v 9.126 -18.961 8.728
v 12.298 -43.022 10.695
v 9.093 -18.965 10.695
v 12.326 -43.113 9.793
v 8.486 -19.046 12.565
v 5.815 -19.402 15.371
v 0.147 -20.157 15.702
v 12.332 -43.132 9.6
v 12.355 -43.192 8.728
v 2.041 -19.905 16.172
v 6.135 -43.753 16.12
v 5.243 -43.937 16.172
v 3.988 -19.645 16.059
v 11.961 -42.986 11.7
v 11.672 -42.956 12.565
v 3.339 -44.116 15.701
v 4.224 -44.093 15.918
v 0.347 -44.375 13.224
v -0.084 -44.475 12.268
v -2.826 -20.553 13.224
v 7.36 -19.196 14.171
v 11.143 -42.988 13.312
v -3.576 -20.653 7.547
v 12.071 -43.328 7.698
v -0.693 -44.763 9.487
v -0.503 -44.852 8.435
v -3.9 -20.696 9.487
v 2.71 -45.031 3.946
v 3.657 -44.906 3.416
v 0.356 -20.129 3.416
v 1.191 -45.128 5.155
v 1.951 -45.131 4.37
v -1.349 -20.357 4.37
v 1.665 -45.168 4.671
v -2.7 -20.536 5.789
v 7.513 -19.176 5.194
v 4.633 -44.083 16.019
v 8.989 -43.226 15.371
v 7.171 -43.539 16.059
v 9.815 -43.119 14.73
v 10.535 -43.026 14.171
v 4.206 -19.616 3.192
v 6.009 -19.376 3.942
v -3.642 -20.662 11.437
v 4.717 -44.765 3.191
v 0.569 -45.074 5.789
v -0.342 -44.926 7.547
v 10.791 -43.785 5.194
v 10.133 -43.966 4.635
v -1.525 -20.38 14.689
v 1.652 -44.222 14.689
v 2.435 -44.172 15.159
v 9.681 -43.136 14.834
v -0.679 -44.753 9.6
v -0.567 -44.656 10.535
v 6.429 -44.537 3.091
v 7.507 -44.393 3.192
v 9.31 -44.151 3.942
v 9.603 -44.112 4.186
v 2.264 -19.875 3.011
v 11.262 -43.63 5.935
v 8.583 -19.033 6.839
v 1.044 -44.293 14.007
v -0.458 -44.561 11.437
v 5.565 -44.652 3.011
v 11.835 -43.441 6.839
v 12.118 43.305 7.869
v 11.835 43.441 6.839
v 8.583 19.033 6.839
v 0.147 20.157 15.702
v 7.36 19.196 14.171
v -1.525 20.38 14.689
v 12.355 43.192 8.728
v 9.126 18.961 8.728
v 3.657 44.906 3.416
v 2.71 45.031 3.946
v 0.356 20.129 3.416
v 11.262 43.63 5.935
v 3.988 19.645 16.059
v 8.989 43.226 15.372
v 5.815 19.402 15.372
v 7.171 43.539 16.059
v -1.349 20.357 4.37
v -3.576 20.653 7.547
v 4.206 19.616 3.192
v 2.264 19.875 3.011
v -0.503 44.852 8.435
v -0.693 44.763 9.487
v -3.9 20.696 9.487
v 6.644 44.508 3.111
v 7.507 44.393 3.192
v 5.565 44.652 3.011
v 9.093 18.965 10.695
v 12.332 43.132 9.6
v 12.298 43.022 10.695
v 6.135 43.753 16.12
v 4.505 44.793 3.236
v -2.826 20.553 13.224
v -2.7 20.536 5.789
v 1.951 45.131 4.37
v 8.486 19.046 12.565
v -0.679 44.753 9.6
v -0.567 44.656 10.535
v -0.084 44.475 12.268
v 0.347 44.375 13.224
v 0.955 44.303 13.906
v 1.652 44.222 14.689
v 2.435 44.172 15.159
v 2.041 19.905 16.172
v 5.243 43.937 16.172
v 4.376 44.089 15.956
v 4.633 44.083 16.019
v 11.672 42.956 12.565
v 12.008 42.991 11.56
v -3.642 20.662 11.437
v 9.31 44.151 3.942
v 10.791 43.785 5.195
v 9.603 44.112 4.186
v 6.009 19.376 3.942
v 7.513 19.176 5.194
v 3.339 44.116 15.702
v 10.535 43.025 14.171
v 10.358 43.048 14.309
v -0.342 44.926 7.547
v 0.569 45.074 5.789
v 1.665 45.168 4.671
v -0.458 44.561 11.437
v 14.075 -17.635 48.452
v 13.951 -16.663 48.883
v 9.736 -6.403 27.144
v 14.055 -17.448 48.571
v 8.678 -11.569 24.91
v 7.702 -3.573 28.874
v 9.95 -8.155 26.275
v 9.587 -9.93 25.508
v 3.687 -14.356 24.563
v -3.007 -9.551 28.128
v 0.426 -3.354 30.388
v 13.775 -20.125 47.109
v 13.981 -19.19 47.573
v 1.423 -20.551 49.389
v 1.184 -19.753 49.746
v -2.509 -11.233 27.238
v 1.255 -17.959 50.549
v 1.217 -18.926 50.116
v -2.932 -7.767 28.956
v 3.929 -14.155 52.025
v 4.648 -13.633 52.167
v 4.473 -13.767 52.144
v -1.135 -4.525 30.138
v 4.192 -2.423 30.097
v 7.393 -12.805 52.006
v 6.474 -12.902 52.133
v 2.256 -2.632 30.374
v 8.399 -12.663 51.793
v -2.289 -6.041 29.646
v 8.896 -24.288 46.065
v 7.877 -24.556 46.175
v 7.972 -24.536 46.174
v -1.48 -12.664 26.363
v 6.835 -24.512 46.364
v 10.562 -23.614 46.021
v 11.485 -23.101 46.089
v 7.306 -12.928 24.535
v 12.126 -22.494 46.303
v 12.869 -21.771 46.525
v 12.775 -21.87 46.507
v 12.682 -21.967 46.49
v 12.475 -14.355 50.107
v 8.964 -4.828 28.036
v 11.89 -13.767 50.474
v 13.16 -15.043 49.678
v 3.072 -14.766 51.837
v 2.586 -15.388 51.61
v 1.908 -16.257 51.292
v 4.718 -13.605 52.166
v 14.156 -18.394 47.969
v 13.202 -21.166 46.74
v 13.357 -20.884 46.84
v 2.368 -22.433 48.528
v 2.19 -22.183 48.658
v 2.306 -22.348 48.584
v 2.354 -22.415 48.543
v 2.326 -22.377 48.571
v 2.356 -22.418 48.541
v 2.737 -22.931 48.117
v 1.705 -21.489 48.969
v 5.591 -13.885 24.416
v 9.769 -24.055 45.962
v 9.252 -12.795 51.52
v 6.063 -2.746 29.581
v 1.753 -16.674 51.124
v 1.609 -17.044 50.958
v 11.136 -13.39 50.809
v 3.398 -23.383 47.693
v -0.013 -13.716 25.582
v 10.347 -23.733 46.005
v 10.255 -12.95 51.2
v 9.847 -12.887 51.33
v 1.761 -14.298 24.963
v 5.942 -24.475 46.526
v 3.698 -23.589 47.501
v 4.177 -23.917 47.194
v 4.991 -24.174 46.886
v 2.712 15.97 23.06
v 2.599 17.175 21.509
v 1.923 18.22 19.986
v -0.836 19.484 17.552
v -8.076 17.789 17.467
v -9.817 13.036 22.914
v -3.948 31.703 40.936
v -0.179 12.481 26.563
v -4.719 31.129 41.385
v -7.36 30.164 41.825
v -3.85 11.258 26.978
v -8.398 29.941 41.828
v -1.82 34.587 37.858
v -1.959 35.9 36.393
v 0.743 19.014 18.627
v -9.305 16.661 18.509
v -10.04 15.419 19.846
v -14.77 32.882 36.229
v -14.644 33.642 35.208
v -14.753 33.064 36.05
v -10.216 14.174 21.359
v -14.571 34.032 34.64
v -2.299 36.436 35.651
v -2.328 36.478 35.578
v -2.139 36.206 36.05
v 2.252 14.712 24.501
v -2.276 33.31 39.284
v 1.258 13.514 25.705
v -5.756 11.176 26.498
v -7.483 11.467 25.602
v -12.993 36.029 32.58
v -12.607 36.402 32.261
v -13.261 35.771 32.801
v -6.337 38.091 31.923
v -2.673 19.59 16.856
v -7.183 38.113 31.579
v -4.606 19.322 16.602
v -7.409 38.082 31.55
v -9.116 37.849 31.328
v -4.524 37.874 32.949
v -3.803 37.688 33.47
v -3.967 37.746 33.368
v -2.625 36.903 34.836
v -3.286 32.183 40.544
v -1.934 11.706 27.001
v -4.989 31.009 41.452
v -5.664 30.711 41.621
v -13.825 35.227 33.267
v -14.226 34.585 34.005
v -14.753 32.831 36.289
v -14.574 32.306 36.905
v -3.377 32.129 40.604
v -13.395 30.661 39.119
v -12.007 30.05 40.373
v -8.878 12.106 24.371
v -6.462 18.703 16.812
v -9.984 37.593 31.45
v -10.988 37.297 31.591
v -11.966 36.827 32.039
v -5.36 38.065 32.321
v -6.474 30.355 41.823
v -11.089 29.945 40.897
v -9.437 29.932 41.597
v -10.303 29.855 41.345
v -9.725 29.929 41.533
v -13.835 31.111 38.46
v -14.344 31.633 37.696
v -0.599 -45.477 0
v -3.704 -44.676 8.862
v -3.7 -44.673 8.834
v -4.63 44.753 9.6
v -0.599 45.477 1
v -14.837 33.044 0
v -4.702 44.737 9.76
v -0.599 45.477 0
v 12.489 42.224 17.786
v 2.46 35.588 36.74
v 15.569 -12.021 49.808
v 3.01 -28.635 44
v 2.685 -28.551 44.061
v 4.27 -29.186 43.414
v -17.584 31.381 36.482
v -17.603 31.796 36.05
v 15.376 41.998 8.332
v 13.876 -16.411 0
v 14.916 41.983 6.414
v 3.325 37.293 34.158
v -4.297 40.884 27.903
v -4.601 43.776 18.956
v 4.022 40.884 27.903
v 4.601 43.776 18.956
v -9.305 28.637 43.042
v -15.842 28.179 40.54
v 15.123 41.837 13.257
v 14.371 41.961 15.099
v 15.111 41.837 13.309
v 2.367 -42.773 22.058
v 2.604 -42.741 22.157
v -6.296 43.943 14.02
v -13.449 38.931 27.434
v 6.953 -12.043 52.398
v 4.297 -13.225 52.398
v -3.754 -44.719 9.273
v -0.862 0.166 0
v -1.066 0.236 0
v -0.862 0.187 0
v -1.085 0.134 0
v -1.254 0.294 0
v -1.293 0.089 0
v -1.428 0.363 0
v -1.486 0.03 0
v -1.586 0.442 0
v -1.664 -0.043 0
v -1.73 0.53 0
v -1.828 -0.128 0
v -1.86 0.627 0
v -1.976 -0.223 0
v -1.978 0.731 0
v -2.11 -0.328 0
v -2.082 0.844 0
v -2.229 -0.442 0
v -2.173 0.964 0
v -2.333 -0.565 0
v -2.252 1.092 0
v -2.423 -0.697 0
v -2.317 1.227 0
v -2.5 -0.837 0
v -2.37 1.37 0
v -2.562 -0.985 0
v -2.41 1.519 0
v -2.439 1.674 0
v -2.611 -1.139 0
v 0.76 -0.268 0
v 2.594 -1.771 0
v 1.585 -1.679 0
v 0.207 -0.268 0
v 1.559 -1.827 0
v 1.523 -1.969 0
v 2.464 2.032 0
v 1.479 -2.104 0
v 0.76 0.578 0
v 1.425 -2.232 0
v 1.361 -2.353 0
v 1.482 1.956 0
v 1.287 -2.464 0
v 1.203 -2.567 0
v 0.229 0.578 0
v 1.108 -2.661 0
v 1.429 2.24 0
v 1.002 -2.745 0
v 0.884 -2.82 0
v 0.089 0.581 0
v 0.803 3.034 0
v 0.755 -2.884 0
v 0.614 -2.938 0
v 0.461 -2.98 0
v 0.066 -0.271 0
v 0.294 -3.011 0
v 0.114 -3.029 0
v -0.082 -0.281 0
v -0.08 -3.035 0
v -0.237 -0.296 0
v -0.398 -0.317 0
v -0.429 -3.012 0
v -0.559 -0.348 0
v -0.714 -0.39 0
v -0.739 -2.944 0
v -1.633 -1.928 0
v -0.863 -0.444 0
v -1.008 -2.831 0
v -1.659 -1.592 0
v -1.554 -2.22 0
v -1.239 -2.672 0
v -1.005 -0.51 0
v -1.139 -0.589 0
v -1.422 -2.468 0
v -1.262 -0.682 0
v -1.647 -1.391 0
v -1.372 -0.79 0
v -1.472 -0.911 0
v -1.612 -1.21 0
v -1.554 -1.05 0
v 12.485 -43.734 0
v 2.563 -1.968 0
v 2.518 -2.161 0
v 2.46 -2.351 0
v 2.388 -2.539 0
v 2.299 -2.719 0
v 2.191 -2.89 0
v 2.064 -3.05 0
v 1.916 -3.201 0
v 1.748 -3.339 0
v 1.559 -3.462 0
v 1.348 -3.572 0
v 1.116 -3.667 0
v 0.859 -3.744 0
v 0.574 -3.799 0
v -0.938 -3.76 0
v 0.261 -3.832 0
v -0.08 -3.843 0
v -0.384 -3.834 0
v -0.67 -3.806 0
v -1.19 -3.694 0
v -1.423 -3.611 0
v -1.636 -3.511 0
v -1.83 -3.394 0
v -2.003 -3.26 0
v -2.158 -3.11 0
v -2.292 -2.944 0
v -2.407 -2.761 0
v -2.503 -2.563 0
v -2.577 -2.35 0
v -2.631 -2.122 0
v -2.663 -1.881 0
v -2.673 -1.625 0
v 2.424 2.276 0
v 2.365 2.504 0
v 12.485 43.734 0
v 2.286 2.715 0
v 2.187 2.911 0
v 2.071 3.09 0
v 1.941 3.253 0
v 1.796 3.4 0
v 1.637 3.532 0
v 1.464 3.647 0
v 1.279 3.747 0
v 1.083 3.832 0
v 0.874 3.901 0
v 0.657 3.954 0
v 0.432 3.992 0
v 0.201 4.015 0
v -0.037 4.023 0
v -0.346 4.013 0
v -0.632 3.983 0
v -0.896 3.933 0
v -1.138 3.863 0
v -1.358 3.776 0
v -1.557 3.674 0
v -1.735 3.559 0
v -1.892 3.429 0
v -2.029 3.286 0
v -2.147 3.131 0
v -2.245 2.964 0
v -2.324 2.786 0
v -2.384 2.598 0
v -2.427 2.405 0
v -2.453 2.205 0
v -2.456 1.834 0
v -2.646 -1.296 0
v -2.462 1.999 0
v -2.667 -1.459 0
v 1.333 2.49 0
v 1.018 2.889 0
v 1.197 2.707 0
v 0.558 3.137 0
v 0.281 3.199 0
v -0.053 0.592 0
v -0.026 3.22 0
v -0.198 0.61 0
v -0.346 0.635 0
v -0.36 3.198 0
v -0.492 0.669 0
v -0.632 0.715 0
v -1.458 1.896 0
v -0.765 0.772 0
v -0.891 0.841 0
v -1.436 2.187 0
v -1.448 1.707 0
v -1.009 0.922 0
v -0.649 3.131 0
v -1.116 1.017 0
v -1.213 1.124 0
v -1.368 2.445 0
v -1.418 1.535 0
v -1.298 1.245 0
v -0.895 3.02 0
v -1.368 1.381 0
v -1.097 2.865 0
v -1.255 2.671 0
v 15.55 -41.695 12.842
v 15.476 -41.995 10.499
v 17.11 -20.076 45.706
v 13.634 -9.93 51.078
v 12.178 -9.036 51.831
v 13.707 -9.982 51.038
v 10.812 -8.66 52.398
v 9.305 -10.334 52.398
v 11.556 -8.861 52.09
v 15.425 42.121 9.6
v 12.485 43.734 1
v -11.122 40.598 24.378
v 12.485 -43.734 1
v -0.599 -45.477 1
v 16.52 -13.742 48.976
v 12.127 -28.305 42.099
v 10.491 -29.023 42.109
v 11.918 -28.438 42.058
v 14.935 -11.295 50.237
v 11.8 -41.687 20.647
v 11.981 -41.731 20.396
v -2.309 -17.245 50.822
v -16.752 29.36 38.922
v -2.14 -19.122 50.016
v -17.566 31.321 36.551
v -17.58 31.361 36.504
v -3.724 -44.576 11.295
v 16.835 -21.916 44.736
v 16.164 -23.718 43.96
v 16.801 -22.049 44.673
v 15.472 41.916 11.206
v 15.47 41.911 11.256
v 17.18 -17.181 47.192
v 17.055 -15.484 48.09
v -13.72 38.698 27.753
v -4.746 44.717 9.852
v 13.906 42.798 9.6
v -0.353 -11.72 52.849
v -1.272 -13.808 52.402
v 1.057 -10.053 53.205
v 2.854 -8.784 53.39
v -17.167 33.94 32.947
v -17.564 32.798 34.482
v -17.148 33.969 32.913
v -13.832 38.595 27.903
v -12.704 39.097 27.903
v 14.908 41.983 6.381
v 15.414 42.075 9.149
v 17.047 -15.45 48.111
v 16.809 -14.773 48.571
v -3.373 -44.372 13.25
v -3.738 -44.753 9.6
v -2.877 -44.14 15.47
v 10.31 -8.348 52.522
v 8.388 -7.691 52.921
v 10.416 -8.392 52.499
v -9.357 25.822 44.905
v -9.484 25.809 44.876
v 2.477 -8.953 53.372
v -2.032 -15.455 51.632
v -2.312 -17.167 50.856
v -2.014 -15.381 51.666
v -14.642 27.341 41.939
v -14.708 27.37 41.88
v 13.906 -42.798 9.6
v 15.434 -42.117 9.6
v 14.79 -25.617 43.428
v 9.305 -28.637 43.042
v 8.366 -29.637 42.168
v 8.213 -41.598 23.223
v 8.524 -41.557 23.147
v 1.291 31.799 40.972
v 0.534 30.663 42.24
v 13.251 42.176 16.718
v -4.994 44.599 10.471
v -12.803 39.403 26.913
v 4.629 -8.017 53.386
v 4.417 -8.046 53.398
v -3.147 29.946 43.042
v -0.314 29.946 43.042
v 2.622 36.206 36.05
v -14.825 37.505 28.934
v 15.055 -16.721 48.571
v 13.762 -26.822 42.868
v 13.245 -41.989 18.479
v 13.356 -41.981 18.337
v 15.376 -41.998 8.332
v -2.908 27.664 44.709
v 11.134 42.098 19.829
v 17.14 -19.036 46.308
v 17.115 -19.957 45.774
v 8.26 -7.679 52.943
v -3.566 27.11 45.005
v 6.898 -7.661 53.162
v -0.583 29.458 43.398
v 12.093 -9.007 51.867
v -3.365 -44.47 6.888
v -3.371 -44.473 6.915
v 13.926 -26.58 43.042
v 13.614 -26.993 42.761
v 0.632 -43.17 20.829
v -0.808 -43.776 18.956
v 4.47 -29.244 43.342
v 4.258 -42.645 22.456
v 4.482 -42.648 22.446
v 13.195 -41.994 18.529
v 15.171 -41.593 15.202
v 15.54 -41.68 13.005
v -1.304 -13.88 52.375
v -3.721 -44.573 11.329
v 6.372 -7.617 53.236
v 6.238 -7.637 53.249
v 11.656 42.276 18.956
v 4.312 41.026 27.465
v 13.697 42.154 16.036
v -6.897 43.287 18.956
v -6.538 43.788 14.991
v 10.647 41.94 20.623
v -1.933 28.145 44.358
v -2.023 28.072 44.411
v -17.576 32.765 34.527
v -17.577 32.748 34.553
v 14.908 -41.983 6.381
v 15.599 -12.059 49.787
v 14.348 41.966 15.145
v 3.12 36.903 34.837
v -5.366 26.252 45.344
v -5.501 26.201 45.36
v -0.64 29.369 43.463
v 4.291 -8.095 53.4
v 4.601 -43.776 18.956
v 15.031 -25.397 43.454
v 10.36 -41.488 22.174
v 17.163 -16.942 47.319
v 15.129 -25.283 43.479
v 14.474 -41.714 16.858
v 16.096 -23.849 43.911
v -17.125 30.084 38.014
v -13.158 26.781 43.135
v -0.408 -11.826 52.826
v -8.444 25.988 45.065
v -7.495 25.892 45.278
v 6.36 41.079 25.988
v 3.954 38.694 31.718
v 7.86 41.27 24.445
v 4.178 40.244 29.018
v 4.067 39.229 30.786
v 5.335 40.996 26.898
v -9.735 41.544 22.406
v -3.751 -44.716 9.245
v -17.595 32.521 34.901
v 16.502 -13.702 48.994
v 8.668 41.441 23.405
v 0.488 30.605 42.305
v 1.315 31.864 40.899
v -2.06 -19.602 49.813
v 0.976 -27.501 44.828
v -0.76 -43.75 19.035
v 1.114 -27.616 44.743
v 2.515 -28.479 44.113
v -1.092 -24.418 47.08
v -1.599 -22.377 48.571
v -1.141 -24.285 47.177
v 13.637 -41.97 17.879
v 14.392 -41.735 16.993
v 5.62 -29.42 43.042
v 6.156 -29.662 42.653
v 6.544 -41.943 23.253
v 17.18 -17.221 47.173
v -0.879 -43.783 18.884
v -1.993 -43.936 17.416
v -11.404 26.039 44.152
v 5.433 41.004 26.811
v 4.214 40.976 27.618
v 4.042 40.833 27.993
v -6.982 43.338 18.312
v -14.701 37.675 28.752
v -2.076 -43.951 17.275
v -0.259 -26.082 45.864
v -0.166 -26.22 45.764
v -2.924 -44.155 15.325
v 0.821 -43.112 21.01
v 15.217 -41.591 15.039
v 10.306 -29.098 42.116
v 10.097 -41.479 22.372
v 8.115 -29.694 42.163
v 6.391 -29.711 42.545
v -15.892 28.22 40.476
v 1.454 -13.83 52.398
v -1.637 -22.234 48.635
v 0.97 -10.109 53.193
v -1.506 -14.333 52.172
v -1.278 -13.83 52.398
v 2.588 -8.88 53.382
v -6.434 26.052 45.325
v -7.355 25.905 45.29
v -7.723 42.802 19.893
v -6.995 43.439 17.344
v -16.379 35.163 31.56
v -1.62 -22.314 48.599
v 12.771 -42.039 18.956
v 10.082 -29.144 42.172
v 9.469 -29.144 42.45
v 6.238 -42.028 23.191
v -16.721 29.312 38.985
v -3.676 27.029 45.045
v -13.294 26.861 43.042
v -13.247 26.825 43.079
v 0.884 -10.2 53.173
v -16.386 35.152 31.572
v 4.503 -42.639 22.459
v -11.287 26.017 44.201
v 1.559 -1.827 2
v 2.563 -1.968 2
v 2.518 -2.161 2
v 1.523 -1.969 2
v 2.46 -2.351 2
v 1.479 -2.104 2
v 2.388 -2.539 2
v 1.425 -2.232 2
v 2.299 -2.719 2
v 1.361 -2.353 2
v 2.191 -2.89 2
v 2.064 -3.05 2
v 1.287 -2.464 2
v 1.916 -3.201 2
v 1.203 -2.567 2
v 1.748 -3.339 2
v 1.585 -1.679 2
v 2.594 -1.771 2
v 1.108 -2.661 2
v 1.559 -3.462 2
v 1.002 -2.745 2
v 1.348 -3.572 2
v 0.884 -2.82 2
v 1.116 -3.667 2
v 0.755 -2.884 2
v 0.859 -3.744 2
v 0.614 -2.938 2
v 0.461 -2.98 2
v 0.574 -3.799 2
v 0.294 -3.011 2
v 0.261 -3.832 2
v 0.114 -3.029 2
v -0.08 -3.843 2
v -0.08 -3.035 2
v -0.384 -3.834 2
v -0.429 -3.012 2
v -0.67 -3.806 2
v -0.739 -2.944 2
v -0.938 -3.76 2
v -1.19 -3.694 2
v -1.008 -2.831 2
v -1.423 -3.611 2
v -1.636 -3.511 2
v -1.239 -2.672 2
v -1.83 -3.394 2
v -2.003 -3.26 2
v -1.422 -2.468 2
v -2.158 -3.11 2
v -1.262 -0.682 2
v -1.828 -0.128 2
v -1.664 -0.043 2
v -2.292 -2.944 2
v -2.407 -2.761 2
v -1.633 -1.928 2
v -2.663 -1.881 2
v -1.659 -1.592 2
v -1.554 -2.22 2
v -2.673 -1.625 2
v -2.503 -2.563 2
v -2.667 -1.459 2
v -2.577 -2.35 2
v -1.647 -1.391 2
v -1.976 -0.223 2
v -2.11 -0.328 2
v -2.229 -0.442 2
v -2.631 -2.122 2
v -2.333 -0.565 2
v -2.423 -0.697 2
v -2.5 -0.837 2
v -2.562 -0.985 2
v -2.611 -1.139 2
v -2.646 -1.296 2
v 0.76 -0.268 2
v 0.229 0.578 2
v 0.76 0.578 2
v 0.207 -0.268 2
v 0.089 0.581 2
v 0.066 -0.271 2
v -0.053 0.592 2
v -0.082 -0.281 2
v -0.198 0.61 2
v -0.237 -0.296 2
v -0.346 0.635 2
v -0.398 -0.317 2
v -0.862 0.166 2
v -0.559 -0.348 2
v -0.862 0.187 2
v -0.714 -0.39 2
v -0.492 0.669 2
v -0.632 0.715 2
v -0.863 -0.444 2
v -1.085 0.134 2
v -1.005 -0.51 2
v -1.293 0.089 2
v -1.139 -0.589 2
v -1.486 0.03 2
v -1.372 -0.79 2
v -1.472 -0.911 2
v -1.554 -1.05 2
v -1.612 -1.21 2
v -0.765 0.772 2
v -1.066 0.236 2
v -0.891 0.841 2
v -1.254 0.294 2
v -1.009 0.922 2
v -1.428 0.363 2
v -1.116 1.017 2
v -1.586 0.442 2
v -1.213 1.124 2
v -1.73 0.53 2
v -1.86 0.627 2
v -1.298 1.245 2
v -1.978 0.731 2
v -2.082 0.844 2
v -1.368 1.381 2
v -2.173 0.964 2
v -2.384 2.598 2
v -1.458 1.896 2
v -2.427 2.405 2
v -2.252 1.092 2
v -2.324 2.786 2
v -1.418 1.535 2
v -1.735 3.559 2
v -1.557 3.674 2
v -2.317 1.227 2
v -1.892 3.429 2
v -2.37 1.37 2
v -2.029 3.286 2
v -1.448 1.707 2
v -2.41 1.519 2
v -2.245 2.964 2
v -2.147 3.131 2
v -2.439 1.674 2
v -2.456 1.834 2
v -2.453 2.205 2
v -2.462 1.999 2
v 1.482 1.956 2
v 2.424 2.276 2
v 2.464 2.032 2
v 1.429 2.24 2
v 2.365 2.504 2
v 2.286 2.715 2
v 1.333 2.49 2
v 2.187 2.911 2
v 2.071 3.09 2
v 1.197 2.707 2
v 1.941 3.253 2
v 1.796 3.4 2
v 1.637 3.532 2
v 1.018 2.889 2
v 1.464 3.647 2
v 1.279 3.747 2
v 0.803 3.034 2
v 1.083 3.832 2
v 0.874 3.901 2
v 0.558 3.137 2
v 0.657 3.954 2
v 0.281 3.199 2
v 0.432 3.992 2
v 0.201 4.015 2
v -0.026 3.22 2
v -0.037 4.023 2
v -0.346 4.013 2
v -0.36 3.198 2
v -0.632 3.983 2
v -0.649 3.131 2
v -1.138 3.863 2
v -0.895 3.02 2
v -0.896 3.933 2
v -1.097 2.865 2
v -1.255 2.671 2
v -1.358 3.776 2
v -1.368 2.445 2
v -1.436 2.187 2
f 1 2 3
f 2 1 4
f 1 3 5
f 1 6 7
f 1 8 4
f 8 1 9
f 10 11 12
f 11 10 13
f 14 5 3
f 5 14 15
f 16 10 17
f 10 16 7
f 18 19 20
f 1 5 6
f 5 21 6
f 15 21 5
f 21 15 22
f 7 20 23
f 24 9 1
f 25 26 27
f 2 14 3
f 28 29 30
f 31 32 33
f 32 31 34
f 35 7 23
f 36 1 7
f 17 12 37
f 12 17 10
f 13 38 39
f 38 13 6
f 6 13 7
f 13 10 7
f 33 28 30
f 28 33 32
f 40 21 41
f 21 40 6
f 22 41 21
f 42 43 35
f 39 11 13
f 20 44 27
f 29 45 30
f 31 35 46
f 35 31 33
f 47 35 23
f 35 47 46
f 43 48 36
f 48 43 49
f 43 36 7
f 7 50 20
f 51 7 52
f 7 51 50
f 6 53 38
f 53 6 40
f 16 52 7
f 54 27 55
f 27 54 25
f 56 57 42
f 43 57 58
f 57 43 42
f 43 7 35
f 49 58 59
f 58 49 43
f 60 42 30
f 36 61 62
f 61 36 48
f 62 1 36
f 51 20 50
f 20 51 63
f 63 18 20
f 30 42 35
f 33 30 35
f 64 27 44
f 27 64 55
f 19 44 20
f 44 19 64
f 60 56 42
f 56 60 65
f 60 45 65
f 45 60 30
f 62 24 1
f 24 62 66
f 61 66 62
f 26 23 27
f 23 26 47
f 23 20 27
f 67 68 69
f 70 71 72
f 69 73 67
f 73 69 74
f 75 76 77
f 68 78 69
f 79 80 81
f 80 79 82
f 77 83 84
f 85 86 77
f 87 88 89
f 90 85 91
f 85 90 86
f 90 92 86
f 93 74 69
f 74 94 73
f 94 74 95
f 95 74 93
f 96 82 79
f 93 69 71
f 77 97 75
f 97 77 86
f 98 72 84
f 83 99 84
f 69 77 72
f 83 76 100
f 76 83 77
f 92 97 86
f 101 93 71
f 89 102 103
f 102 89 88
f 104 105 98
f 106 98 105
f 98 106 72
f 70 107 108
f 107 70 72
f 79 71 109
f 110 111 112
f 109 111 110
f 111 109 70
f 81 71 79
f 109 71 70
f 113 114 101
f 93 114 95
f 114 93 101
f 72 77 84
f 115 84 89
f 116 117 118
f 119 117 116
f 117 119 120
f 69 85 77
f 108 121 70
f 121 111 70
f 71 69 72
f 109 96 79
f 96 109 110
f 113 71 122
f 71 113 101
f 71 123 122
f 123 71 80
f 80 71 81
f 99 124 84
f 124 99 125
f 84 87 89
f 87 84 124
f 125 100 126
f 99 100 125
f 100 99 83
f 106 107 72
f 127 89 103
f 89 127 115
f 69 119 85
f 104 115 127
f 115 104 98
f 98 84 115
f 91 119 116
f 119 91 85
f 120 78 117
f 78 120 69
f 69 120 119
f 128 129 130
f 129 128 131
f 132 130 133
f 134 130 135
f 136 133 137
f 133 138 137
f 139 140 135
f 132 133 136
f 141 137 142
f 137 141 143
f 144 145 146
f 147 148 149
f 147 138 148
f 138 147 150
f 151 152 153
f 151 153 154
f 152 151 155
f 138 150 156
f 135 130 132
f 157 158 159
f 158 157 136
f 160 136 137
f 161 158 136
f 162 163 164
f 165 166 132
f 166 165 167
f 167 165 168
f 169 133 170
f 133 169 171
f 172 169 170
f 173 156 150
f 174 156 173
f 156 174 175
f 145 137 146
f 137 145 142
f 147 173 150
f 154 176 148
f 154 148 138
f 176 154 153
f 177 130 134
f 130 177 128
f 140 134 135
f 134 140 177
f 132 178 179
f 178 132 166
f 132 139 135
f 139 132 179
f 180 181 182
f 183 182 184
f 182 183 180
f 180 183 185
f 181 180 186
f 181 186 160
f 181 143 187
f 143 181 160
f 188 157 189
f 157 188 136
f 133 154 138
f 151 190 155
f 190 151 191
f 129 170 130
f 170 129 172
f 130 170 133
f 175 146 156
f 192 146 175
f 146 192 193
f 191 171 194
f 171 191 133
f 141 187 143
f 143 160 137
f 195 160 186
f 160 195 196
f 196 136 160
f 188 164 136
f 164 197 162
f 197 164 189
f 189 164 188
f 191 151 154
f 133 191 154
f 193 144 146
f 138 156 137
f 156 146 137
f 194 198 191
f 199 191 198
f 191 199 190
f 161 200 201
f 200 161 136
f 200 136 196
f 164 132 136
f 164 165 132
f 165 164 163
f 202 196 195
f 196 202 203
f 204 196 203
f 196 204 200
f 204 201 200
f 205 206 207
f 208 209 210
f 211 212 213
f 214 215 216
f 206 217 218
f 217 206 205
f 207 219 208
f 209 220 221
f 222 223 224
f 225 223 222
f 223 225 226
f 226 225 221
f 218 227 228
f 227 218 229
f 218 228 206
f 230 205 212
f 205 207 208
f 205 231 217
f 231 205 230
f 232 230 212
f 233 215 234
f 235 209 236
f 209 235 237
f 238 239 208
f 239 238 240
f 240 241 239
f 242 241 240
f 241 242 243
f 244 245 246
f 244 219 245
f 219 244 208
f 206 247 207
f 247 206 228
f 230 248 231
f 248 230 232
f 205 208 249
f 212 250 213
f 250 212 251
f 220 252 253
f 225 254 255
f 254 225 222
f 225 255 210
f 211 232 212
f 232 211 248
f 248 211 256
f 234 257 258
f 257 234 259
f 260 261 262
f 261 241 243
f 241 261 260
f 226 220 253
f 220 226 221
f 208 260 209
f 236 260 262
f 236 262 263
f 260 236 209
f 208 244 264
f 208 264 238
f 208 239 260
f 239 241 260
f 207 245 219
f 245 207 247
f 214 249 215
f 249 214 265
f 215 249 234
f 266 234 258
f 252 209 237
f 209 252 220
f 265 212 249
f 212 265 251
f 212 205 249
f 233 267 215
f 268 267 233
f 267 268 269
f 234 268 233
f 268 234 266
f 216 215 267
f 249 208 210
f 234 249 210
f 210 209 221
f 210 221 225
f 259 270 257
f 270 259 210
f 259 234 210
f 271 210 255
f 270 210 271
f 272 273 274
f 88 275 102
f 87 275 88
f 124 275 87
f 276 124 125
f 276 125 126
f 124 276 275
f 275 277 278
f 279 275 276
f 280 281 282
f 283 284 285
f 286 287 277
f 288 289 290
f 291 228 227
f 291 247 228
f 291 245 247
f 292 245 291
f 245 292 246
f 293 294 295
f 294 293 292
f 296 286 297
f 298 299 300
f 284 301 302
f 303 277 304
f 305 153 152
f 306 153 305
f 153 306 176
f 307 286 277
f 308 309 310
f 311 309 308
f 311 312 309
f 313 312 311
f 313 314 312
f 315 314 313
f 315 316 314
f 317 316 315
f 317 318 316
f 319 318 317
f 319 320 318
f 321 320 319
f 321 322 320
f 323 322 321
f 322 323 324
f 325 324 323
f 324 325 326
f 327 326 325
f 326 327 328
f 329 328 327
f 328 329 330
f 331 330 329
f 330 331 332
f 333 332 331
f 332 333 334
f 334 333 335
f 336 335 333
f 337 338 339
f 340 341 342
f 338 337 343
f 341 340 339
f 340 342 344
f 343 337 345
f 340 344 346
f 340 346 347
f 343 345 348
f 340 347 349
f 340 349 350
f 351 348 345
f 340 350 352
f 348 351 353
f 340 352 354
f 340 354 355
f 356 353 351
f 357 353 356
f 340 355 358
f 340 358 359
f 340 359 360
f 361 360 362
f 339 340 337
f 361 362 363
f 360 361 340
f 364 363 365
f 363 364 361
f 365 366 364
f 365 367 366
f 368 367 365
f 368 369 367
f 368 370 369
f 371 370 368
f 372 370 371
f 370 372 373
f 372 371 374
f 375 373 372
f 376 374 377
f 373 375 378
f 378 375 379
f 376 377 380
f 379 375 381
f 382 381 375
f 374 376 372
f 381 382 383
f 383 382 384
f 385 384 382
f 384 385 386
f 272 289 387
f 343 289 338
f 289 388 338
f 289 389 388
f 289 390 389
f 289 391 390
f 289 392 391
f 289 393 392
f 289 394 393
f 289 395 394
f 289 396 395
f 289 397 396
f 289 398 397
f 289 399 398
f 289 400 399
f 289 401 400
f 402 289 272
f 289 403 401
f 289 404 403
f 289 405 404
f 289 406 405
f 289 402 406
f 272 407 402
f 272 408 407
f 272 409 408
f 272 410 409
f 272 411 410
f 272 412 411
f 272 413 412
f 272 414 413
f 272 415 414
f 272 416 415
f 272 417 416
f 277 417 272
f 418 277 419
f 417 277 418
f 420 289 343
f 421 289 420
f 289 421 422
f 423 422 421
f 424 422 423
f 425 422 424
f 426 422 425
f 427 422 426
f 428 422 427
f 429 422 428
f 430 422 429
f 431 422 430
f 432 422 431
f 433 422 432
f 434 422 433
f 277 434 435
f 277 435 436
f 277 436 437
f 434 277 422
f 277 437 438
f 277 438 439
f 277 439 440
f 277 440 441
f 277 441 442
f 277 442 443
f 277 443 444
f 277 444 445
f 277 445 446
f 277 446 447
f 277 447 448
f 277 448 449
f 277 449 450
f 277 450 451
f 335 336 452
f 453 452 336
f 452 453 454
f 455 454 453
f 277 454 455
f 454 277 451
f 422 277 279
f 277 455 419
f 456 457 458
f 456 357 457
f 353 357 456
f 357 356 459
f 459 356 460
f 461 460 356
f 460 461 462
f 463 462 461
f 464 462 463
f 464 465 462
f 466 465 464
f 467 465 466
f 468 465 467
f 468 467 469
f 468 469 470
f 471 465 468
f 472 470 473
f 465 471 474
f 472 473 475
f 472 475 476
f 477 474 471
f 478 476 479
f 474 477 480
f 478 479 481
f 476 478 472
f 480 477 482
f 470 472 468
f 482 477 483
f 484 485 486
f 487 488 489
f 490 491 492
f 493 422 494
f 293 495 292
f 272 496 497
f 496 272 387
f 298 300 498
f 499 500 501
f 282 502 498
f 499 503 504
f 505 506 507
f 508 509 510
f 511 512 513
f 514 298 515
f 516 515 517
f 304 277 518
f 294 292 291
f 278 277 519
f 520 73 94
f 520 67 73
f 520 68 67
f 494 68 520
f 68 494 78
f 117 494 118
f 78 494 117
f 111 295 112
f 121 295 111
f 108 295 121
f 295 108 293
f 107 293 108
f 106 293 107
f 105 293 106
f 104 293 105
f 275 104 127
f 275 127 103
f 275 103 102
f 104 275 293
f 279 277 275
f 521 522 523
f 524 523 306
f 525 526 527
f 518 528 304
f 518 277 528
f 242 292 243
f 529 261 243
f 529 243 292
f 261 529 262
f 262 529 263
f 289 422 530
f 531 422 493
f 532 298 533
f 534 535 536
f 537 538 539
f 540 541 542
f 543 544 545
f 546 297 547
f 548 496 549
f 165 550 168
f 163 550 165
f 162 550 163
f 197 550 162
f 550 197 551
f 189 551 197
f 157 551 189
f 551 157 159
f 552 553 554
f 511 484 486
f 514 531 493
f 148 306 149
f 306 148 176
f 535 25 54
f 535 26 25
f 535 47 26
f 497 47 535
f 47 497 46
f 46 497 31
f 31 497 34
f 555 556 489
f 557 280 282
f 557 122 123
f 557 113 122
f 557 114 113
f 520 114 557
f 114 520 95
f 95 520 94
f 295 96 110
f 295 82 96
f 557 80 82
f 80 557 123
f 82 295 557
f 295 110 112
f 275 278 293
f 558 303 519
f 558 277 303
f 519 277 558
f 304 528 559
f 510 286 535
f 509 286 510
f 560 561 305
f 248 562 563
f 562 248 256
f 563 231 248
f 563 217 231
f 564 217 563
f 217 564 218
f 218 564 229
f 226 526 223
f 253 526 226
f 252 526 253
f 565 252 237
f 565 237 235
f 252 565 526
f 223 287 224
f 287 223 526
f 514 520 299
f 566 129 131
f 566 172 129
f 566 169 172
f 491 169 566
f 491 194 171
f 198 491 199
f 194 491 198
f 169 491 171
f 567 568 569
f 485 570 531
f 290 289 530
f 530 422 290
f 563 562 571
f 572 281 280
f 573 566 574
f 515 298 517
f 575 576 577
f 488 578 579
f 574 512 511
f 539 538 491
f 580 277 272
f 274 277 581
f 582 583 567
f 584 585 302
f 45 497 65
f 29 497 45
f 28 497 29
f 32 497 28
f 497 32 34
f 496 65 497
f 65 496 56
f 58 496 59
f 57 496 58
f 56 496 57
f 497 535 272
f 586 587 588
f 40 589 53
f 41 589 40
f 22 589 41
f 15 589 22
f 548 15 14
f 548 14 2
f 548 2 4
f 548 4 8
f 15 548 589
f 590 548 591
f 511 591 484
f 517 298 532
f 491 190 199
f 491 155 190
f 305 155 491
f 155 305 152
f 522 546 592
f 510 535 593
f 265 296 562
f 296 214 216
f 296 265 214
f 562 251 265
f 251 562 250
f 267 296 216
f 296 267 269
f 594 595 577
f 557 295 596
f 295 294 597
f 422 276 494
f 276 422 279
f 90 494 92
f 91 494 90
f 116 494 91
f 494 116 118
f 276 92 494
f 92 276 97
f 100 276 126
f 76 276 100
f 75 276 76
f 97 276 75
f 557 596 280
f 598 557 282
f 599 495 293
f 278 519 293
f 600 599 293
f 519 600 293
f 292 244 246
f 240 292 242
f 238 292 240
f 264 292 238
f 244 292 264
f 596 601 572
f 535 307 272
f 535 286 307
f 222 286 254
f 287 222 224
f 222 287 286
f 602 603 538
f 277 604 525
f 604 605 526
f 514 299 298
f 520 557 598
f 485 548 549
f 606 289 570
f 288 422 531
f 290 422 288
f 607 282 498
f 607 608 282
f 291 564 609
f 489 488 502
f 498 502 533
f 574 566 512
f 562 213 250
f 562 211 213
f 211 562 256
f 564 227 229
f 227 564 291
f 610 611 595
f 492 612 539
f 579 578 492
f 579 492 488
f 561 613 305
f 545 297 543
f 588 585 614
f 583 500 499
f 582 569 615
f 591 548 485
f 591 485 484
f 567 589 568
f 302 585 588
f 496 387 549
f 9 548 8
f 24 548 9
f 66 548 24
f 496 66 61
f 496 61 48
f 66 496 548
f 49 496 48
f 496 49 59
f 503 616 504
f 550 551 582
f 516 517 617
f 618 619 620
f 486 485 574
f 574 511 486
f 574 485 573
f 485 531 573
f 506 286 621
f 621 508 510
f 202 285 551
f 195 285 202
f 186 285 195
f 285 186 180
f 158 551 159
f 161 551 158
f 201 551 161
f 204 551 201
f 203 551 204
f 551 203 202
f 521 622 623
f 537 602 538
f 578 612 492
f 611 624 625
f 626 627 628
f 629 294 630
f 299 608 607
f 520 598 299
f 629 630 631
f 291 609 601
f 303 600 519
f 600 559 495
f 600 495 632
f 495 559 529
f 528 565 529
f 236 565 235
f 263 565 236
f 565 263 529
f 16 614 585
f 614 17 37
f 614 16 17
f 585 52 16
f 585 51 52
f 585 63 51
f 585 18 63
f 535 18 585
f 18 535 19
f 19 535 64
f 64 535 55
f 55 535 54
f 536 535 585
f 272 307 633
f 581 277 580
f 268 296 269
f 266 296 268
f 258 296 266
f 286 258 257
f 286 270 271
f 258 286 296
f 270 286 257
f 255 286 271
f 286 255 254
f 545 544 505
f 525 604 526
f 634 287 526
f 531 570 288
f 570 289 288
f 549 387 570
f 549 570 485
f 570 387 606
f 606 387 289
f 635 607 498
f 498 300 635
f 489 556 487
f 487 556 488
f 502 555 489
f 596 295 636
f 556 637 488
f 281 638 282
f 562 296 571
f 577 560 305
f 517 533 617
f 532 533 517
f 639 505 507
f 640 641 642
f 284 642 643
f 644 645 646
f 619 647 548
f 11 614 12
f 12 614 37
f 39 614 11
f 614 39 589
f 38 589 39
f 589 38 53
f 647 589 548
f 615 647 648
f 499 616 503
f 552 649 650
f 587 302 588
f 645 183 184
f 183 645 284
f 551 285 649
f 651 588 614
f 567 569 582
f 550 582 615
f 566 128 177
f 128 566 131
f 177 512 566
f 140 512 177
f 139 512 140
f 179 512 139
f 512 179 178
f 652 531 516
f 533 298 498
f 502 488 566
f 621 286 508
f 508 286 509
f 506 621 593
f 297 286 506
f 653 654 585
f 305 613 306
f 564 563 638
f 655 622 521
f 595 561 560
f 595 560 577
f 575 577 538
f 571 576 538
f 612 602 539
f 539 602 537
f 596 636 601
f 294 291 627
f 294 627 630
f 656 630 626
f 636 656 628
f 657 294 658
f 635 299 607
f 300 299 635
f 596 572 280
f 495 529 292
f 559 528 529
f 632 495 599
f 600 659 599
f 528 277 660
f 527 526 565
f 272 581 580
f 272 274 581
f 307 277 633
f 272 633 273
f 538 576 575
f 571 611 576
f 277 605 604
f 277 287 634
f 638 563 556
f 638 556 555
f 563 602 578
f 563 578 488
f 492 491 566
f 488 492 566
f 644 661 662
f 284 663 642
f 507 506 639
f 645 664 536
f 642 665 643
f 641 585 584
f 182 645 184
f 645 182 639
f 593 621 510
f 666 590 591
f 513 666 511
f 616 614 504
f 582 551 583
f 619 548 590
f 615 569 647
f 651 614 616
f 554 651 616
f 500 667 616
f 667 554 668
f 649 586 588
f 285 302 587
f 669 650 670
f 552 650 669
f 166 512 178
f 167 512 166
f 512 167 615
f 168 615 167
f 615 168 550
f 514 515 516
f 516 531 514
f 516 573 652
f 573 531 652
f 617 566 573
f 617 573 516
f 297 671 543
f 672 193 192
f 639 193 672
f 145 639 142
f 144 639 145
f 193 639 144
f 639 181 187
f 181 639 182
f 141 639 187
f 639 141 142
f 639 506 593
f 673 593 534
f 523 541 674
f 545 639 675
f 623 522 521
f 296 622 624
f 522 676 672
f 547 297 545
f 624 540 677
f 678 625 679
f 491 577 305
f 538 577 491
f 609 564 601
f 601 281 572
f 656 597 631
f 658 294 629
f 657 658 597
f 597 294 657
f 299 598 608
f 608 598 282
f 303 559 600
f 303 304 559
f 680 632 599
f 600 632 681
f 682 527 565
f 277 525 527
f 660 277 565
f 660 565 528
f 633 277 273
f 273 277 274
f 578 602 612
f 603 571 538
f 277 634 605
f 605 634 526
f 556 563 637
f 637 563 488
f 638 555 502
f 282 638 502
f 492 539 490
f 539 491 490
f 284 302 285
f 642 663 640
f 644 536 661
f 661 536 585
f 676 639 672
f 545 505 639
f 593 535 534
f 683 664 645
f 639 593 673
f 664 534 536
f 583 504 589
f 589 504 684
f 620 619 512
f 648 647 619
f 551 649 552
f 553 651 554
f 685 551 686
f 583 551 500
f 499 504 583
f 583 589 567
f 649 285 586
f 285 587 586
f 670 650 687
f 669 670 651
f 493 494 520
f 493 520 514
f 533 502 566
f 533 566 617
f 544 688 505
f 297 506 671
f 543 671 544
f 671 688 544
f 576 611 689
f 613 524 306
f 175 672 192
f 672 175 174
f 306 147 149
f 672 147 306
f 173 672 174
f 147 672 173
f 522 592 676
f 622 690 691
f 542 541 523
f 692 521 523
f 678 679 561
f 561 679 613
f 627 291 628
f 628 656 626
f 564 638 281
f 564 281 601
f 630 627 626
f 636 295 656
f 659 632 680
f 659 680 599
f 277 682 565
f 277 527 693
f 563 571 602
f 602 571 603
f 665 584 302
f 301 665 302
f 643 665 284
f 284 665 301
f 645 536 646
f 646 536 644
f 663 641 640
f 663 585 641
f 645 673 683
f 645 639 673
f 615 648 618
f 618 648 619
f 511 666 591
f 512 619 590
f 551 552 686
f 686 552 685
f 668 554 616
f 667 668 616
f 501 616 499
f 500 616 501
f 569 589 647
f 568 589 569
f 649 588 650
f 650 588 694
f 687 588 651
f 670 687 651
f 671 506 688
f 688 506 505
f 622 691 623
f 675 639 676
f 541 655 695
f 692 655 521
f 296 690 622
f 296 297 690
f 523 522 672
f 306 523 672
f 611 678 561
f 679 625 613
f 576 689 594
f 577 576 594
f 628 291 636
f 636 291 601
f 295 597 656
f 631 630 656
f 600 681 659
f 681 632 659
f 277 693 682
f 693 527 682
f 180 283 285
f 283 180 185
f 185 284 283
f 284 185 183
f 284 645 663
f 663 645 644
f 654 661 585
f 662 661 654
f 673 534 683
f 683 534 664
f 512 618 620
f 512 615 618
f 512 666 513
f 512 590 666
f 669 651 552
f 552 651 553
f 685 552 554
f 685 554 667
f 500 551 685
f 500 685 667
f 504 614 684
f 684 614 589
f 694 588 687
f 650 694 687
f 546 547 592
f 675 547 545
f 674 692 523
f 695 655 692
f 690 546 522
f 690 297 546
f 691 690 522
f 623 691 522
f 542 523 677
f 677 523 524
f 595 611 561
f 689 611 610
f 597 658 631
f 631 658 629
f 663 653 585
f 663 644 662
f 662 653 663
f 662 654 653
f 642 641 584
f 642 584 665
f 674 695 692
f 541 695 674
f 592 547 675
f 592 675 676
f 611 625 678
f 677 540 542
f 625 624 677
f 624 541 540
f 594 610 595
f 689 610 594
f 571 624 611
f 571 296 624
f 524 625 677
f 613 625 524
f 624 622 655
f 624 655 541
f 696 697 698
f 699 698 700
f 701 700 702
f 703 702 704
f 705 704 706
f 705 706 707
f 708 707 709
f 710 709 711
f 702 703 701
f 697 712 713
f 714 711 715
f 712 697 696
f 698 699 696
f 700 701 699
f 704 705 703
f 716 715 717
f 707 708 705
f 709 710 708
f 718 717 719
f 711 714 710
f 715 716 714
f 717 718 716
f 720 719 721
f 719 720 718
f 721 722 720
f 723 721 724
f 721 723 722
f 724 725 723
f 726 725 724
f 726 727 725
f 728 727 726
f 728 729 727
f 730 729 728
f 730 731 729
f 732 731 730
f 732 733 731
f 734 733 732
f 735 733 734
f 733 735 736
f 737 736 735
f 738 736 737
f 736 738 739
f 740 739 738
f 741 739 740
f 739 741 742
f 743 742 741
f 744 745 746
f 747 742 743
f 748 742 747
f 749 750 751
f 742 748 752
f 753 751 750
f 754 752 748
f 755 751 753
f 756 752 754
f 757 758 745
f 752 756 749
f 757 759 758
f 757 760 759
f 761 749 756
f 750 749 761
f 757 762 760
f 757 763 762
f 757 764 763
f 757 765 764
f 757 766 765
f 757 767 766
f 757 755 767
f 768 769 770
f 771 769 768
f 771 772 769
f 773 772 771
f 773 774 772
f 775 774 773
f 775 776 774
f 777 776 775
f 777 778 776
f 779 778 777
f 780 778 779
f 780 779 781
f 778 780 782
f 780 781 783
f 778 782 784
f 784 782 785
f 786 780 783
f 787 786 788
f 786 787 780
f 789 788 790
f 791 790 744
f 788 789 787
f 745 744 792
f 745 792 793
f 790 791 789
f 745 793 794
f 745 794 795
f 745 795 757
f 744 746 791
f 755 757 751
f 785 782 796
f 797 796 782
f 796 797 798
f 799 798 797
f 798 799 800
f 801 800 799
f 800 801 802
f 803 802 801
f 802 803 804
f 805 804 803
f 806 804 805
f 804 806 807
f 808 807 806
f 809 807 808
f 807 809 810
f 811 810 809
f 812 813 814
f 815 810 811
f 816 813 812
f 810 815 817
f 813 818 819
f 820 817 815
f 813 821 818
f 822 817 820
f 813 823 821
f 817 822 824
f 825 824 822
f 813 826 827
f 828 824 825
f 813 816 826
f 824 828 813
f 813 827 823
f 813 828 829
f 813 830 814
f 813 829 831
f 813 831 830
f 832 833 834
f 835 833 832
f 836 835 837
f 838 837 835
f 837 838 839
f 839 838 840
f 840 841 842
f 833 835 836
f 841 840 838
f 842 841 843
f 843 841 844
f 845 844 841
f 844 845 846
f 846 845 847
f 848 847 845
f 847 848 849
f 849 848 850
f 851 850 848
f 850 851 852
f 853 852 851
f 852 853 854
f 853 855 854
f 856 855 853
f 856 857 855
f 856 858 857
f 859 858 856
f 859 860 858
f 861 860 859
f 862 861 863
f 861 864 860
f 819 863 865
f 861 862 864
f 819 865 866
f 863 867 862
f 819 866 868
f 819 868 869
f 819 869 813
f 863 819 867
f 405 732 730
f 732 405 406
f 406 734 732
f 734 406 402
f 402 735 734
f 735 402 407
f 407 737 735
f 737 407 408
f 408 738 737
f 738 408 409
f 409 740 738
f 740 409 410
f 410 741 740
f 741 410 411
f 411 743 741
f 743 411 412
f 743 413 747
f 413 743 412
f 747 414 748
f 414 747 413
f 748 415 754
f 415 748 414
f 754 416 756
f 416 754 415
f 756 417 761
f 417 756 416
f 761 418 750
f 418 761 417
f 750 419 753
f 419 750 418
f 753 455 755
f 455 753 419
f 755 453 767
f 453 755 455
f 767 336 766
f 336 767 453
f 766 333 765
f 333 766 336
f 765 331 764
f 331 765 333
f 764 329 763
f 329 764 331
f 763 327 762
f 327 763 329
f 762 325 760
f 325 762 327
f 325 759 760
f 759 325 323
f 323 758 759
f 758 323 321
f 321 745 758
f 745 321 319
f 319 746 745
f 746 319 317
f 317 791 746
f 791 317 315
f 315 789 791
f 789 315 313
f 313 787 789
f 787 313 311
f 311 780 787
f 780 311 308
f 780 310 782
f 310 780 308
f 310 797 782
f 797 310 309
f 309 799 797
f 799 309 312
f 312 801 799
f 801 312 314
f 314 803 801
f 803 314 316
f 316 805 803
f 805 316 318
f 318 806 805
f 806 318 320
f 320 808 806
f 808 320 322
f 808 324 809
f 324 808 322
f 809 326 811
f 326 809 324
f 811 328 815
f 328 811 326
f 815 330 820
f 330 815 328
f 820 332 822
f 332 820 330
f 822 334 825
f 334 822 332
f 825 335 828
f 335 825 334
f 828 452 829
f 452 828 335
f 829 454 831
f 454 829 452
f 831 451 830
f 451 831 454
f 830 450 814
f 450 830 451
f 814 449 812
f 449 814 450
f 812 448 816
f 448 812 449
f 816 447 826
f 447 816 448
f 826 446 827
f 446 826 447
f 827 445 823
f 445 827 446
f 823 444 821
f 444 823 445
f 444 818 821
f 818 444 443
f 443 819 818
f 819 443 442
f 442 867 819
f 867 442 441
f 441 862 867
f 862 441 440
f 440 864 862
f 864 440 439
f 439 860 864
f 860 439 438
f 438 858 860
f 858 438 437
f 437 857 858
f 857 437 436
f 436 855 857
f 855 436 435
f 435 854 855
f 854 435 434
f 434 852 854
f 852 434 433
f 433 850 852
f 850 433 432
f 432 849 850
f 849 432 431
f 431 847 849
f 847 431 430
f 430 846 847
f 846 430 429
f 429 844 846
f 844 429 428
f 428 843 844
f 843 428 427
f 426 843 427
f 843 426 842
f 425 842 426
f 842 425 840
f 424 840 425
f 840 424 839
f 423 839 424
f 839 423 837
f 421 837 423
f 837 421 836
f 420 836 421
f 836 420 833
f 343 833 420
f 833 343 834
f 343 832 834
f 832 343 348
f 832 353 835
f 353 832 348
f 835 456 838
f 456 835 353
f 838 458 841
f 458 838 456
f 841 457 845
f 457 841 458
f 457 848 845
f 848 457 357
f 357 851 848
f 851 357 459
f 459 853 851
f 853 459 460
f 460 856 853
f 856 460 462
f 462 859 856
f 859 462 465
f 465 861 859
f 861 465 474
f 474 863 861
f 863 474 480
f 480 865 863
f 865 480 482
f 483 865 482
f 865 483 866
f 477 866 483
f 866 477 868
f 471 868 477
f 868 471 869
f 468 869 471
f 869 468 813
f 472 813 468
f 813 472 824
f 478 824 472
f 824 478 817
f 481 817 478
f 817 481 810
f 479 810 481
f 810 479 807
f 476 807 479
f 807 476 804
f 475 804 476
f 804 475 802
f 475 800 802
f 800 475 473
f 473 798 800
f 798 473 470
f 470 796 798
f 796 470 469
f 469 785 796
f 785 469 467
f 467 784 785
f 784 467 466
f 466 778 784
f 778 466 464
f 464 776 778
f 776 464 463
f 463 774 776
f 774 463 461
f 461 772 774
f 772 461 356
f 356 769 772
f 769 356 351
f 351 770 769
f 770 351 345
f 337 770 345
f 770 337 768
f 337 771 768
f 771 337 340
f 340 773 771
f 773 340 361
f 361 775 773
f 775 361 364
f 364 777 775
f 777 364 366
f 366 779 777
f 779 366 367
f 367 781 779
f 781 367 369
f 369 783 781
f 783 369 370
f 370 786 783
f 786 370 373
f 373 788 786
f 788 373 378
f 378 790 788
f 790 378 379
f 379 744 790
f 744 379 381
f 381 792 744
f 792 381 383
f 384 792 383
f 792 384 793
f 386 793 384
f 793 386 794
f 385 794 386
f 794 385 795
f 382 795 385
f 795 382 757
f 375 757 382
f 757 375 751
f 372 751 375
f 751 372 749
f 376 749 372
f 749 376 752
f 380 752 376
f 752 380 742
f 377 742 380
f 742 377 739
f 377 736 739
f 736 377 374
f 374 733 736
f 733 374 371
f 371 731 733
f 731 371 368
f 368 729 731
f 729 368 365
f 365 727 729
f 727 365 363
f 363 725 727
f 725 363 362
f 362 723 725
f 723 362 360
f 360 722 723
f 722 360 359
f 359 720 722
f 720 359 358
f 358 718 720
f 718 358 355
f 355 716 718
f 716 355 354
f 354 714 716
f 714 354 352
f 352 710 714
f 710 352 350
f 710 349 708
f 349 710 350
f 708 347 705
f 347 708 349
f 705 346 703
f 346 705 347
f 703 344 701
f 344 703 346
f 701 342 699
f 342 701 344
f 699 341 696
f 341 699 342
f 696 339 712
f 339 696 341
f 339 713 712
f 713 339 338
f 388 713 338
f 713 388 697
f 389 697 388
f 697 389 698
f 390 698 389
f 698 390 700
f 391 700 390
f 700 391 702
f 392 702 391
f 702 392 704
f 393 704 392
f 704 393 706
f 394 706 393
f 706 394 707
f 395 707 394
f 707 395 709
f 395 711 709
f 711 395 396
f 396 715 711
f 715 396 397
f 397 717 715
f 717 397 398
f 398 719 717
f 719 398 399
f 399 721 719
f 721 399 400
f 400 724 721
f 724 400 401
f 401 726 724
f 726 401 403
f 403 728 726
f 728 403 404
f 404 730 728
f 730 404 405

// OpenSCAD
difference() {
	difference() {
		difference() {
			hull() {
				union() {
					union() {
						rotate(a = -82.4109105310, v = [0, 0, 1]) {
							translate(v = [0, -6.6000000000, 0]) {
								cube(size = [45.0000000000, 13.2000000000, 1]);
							}
						}
						rotate(a = 82.4109105310, v = [0, 0, 1]) {
							translate(v = [0, -6.6000000000, 0]) {
								cube(size = [45.0000000000, 13.2000000000, 1]);
							}
						}
						rotate(a = -67.6677717788, v = [0, 0, 1]) {
							translate(v = [0, -6.6000000000, 0]) {
								cube(size = [20.4525250299, 13.2000000000, 1]);
							}
						}
						rotate(a = 103.6815262095, v = [0, 0, 1]) {
							translate(v = [0, -6.6000000000, 0]) {
								cube(size = [35.6153287997, 13.2000000000, 1]);
							}
						}
					}
					translate(v = [0, 0, 9.6000038647]) {
						intersection() {
							hull() {
								rotate(a = 90.0000541477, v = [0.9912407072, 0.1320676359, -0.0000011233]) {
									cylinder(h = 45, r = 9.6000000000);
								}
								rotate(a = 89.9999292057, v = [-0.9912407072, 0.1320676359, 0.0000008592]) {
									cylinder(h = 45, r = 9.6000000000);
								}
								rotate(a = 27.0328349697, v = [0.4204121474, 0.1726986487, -0.0000005931]) {
									cylinder(h = 45, r = 9.6000000000);
								}
								rotate(a = 52.3213454804, v = [-0.7689940390, -0.1871986406, 0.0000009562]) {
									cylinder(h = 45, r = 9.6000000000);
								}
							}
							sphere(r = 45);
						}
					}
				}
			}
			translate(v = [0, 0, 9.6000038647]) {
				rotate(a = 90.0000541477, v = [0.9912407072, 0.1320676359, -0.0000011233]) {
					translate(v = [0, 0, 20]) {
						cylinder(h = 45, r = 6.6000000000);
					}
				}
				rotate(a = 89.9999292057, v = [-0.9912407072, 0.1320676359, 0.0000008592]) {
					translate(v = [0, 0, 20]) {
						cylinder(h = 45, r = 6.6000000000);
					}
				}
				rotate(a = 27.0328349697, v = [0.4204121474, 0.1726986487, -0.0000005931]) {
					translate(v = [0, 0, 20]) {
						cylinder(h = 45, r = 6.6000000000);
					}
				}
				rotate(a = 52.3213454804, v = [-0.7689940390, -0.1871986406, 0.0000009562]) {
					translate(v = [0, 0, 20]) {
						cylinder(h = 45, r = 6.6000000000);
					}
				}
			}
		}
		translate(v = [-100, -100, -100]) {
			cube(size = [200, 200, 100]);
		}
	}
	translate(v = [0, 0, 2]) {
		rotate(a = 180, v = [0, 1, 0]) {
			linear_extrude(height = 3) {
				text(halign = "center", size = 8, text = "3", valign = "center");
			}
		}
	}
}
